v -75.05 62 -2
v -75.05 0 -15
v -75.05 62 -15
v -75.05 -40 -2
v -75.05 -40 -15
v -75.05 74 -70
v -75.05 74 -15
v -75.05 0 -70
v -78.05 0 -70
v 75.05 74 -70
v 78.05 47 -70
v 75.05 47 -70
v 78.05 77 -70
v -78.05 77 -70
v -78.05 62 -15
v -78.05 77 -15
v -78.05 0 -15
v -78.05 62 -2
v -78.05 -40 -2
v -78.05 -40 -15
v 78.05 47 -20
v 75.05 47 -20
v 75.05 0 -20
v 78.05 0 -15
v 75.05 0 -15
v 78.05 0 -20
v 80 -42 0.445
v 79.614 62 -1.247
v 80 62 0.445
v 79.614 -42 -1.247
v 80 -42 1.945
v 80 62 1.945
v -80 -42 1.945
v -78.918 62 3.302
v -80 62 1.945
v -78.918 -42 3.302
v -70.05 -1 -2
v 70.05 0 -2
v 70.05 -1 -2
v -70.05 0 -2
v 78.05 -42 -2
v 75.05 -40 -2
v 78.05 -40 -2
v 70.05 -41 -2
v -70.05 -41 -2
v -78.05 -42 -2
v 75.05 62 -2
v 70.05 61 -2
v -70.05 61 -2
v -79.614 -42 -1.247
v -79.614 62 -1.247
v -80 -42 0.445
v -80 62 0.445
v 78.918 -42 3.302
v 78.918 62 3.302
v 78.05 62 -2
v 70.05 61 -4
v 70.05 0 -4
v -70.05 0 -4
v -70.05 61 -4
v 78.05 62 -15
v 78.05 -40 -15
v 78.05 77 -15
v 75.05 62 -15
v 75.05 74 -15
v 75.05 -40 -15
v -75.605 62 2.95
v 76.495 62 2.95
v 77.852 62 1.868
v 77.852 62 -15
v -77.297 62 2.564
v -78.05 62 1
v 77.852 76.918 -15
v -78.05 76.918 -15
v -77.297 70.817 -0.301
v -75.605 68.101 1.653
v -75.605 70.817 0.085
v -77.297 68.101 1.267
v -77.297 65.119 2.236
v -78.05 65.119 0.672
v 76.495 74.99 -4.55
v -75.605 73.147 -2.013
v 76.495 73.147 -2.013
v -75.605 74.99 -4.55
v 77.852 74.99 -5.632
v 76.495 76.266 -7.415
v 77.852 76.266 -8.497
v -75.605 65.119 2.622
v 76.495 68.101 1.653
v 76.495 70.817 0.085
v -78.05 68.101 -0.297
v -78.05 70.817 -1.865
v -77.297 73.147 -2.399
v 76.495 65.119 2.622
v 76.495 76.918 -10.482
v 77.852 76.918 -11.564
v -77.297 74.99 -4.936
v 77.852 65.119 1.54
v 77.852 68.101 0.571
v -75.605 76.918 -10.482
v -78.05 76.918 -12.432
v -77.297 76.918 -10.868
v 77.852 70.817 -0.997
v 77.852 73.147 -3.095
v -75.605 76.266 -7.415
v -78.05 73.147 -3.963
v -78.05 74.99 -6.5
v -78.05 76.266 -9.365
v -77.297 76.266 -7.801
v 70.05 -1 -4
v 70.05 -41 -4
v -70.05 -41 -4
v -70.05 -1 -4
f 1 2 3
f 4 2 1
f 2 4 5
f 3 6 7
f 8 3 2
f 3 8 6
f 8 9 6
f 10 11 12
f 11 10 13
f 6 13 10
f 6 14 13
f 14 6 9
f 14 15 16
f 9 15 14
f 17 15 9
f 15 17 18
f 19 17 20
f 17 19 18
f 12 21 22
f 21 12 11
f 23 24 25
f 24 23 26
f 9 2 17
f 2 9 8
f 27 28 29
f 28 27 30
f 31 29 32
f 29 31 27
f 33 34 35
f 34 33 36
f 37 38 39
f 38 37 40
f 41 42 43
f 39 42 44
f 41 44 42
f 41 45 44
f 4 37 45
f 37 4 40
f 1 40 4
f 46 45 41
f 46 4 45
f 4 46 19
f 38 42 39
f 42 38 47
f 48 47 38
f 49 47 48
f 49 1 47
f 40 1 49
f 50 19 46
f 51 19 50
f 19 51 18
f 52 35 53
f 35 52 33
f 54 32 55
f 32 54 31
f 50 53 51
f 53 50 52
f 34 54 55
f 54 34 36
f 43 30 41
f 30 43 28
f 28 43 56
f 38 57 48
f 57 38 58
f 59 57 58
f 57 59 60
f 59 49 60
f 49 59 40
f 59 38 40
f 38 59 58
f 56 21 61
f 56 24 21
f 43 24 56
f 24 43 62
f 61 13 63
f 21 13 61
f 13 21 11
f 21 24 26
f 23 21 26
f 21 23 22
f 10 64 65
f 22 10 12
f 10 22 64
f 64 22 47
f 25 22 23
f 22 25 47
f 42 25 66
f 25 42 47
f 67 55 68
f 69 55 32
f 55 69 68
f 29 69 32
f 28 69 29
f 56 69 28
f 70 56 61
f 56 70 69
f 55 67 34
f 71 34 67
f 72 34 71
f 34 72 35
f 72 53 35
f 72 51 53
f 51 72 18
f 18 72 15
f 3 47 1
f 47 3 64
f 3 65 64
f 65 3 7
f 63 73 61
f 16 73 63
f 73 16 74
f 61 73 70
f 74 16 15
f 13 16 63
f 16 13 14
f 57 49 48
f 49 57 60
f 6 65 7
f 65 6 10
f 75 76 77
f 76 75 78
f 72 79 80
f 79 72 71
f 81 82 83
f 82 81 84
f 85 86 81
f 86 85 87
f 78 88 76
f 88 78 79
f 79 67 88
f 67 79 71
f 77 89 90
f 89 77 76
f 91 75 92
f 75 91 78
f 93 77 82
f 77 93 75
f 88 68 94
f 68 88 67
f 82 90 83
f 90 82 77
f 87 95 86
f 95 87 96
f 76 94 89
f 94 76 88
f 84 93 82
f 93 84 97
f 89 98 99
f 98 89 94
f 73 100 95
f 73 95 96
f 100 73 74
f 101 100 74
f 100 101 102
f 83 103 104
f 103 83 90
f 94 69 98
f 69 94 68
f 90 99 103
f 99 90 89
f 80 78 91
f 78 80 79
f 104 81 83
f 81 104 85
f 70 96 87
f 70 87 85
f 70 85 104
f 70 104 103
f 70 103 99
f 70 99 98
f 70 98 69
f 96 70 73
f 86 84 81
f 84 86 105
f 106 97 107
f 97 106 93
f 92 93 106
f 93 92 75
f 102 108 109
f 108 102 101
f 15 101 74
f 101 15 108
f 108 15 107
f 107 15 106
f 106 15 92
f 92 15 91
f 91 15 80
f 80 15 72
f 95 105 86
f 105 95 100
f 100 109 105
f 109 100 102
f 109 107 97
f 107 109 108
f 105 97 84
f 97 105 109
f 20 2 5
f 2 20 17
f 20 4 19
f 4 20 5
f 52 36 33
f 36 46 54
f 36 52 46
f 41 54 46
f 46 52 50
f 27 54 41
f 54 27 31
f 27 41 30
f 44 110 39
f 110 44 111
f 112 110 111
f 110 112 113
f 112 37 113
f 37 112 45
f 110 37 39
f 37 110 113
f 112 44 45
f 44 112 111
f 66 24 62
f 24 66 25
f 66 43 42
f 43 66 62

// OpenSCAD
// we want something that can sit across the
// 5.25" bay holders and support the XTOP's
// mounts, designed to mate to a 120mm fan.
// 5.25" bay is 146.1mm wide
w = 146.1;

// we want to look like a 120mm fan
iw = 120;
hw = 105; // screw hole centers are 105mm apart

// the mounts are 26mm
m1 = 47;

// we need a 16mm tall core to match the height
// of the other mount, sitting atop two fans and
// a radiator. on the outside, though, we don't
// want it so thicc, in case there's another
// device in the next bay up
h1 = 20;

// come just about down to the bottom
h2 = 70;

// brace we're topping is 1.5mm wide. give it
// an extra half mm.
i = 2;

// 5.55mm diameter screws
sw = 5.55 / 2;

// the wings on the sides hold us onto the
// braces. if they're too thin, they'll break off.
ww = 3;

translate([-w/2, 0, 0]){
    // left wing is extended to the bottom
    translate([-(i + ww), 0, -h2]){
        cube([ww, m1, h2]);
    }
    // common layer
    translate([-(i + ww), 0, 0]){
        minkowski(){
            cube([w + i * 2 + ww * 2, m1, 1.5]);
            rotate([90, 90, 0]){
                cylinder(r = 2, h = 2);
            }
        }
    }
    // middle piece to wedge us atop bay mounts
    translate([i + 1, 0, -4]){
        cube([w - i * 2 - 2, m1, 4]);
    }
    // right wing
    translate([w + i, 0, -h1]){
        cube([ww, m1, h1]);
    }
}

// 15mm from xtop brace to back
m2 = 15;

translate([0, m1, 0]){
translate([-w/2, 0, 0]){
    // left wing
    translate([-(i + ww), 0, -h2]){
      cube([ww, m2, h2]);
    }
    translate([-(i + ww), 15, -h2]){
      cube([ww, m2, h2 - 15]);
    }
    
    // common layer
    translate([-(i + ww), 0, 0]){
        minkowski(){
            cube([w + i * 2 + ww * 2, m2, 1.5]);
            rotate([90, 90, 0]){
                cylinder(r = 2, h = 2);
            }
        }
    }
    // middle piece to wedge us atop bay mounts
    translate([i + 1, -1, -4]){
        cube([w - i * 2 - 2, m2, 4]);
    }
    // right wing
    translate([w + i, 0, -h2]){
      cube([ww, m2, h2]);
    }
    translate([w + i, 15, -h2]){
      cube([ww, m2, h2 - 15]);
    }

    // backplate
    translate([-i, m2 + 12, -h2]){
      cube([w + i * 2, ww, h2 - 15]);
    }

}

difference(){
  translate([0, m2, -m2 + 1]){
    rotate([0, 90, 0]){
      minkowski(){
        cylinder(w + i * 3, m2, m2, true);
        rotate([90, 90, 0]){
          cylinder(2, 2, 2);
        }
      }
    }
  }
  union(){
    translate([0, 0, -45]){
      cube([w + i * 15, m2 * 4, m2 * 4], true);
    }
    translate([0, -m2, -m2]){
      cube([w + i * 15, m2 * 4, m2 * 4], true);
    }
  }
}
}

// 40mm from xtop brace to fan
m3 = 40;

// don't interfere with the screws
h3 = 15;

translate([-w/2, -m3, 0]){
    // left wing
    translate([-(i + ww), 0, -h3]){
        cube([ww, m3, h3]);
    }
    // common layer
    translate([-(i + ww), 0, 0]){
        minkowski(){
            cube([w + i * 2 + ww * 2, m3, 1.5]);
            rotate([90, 90, 0]){
                cylinder(r = 2, h = 2);
            }
        }
    }
    // middle piece to wedge us atop bay mounts
    translate([i + 1, -1, -4]){
        cube([w - i * 2 - 2, m3, 4]);
    }
    // right wing
    translate([w + i, 0, -h3]){
        cube([ww, m3, h3]);
    }
}
